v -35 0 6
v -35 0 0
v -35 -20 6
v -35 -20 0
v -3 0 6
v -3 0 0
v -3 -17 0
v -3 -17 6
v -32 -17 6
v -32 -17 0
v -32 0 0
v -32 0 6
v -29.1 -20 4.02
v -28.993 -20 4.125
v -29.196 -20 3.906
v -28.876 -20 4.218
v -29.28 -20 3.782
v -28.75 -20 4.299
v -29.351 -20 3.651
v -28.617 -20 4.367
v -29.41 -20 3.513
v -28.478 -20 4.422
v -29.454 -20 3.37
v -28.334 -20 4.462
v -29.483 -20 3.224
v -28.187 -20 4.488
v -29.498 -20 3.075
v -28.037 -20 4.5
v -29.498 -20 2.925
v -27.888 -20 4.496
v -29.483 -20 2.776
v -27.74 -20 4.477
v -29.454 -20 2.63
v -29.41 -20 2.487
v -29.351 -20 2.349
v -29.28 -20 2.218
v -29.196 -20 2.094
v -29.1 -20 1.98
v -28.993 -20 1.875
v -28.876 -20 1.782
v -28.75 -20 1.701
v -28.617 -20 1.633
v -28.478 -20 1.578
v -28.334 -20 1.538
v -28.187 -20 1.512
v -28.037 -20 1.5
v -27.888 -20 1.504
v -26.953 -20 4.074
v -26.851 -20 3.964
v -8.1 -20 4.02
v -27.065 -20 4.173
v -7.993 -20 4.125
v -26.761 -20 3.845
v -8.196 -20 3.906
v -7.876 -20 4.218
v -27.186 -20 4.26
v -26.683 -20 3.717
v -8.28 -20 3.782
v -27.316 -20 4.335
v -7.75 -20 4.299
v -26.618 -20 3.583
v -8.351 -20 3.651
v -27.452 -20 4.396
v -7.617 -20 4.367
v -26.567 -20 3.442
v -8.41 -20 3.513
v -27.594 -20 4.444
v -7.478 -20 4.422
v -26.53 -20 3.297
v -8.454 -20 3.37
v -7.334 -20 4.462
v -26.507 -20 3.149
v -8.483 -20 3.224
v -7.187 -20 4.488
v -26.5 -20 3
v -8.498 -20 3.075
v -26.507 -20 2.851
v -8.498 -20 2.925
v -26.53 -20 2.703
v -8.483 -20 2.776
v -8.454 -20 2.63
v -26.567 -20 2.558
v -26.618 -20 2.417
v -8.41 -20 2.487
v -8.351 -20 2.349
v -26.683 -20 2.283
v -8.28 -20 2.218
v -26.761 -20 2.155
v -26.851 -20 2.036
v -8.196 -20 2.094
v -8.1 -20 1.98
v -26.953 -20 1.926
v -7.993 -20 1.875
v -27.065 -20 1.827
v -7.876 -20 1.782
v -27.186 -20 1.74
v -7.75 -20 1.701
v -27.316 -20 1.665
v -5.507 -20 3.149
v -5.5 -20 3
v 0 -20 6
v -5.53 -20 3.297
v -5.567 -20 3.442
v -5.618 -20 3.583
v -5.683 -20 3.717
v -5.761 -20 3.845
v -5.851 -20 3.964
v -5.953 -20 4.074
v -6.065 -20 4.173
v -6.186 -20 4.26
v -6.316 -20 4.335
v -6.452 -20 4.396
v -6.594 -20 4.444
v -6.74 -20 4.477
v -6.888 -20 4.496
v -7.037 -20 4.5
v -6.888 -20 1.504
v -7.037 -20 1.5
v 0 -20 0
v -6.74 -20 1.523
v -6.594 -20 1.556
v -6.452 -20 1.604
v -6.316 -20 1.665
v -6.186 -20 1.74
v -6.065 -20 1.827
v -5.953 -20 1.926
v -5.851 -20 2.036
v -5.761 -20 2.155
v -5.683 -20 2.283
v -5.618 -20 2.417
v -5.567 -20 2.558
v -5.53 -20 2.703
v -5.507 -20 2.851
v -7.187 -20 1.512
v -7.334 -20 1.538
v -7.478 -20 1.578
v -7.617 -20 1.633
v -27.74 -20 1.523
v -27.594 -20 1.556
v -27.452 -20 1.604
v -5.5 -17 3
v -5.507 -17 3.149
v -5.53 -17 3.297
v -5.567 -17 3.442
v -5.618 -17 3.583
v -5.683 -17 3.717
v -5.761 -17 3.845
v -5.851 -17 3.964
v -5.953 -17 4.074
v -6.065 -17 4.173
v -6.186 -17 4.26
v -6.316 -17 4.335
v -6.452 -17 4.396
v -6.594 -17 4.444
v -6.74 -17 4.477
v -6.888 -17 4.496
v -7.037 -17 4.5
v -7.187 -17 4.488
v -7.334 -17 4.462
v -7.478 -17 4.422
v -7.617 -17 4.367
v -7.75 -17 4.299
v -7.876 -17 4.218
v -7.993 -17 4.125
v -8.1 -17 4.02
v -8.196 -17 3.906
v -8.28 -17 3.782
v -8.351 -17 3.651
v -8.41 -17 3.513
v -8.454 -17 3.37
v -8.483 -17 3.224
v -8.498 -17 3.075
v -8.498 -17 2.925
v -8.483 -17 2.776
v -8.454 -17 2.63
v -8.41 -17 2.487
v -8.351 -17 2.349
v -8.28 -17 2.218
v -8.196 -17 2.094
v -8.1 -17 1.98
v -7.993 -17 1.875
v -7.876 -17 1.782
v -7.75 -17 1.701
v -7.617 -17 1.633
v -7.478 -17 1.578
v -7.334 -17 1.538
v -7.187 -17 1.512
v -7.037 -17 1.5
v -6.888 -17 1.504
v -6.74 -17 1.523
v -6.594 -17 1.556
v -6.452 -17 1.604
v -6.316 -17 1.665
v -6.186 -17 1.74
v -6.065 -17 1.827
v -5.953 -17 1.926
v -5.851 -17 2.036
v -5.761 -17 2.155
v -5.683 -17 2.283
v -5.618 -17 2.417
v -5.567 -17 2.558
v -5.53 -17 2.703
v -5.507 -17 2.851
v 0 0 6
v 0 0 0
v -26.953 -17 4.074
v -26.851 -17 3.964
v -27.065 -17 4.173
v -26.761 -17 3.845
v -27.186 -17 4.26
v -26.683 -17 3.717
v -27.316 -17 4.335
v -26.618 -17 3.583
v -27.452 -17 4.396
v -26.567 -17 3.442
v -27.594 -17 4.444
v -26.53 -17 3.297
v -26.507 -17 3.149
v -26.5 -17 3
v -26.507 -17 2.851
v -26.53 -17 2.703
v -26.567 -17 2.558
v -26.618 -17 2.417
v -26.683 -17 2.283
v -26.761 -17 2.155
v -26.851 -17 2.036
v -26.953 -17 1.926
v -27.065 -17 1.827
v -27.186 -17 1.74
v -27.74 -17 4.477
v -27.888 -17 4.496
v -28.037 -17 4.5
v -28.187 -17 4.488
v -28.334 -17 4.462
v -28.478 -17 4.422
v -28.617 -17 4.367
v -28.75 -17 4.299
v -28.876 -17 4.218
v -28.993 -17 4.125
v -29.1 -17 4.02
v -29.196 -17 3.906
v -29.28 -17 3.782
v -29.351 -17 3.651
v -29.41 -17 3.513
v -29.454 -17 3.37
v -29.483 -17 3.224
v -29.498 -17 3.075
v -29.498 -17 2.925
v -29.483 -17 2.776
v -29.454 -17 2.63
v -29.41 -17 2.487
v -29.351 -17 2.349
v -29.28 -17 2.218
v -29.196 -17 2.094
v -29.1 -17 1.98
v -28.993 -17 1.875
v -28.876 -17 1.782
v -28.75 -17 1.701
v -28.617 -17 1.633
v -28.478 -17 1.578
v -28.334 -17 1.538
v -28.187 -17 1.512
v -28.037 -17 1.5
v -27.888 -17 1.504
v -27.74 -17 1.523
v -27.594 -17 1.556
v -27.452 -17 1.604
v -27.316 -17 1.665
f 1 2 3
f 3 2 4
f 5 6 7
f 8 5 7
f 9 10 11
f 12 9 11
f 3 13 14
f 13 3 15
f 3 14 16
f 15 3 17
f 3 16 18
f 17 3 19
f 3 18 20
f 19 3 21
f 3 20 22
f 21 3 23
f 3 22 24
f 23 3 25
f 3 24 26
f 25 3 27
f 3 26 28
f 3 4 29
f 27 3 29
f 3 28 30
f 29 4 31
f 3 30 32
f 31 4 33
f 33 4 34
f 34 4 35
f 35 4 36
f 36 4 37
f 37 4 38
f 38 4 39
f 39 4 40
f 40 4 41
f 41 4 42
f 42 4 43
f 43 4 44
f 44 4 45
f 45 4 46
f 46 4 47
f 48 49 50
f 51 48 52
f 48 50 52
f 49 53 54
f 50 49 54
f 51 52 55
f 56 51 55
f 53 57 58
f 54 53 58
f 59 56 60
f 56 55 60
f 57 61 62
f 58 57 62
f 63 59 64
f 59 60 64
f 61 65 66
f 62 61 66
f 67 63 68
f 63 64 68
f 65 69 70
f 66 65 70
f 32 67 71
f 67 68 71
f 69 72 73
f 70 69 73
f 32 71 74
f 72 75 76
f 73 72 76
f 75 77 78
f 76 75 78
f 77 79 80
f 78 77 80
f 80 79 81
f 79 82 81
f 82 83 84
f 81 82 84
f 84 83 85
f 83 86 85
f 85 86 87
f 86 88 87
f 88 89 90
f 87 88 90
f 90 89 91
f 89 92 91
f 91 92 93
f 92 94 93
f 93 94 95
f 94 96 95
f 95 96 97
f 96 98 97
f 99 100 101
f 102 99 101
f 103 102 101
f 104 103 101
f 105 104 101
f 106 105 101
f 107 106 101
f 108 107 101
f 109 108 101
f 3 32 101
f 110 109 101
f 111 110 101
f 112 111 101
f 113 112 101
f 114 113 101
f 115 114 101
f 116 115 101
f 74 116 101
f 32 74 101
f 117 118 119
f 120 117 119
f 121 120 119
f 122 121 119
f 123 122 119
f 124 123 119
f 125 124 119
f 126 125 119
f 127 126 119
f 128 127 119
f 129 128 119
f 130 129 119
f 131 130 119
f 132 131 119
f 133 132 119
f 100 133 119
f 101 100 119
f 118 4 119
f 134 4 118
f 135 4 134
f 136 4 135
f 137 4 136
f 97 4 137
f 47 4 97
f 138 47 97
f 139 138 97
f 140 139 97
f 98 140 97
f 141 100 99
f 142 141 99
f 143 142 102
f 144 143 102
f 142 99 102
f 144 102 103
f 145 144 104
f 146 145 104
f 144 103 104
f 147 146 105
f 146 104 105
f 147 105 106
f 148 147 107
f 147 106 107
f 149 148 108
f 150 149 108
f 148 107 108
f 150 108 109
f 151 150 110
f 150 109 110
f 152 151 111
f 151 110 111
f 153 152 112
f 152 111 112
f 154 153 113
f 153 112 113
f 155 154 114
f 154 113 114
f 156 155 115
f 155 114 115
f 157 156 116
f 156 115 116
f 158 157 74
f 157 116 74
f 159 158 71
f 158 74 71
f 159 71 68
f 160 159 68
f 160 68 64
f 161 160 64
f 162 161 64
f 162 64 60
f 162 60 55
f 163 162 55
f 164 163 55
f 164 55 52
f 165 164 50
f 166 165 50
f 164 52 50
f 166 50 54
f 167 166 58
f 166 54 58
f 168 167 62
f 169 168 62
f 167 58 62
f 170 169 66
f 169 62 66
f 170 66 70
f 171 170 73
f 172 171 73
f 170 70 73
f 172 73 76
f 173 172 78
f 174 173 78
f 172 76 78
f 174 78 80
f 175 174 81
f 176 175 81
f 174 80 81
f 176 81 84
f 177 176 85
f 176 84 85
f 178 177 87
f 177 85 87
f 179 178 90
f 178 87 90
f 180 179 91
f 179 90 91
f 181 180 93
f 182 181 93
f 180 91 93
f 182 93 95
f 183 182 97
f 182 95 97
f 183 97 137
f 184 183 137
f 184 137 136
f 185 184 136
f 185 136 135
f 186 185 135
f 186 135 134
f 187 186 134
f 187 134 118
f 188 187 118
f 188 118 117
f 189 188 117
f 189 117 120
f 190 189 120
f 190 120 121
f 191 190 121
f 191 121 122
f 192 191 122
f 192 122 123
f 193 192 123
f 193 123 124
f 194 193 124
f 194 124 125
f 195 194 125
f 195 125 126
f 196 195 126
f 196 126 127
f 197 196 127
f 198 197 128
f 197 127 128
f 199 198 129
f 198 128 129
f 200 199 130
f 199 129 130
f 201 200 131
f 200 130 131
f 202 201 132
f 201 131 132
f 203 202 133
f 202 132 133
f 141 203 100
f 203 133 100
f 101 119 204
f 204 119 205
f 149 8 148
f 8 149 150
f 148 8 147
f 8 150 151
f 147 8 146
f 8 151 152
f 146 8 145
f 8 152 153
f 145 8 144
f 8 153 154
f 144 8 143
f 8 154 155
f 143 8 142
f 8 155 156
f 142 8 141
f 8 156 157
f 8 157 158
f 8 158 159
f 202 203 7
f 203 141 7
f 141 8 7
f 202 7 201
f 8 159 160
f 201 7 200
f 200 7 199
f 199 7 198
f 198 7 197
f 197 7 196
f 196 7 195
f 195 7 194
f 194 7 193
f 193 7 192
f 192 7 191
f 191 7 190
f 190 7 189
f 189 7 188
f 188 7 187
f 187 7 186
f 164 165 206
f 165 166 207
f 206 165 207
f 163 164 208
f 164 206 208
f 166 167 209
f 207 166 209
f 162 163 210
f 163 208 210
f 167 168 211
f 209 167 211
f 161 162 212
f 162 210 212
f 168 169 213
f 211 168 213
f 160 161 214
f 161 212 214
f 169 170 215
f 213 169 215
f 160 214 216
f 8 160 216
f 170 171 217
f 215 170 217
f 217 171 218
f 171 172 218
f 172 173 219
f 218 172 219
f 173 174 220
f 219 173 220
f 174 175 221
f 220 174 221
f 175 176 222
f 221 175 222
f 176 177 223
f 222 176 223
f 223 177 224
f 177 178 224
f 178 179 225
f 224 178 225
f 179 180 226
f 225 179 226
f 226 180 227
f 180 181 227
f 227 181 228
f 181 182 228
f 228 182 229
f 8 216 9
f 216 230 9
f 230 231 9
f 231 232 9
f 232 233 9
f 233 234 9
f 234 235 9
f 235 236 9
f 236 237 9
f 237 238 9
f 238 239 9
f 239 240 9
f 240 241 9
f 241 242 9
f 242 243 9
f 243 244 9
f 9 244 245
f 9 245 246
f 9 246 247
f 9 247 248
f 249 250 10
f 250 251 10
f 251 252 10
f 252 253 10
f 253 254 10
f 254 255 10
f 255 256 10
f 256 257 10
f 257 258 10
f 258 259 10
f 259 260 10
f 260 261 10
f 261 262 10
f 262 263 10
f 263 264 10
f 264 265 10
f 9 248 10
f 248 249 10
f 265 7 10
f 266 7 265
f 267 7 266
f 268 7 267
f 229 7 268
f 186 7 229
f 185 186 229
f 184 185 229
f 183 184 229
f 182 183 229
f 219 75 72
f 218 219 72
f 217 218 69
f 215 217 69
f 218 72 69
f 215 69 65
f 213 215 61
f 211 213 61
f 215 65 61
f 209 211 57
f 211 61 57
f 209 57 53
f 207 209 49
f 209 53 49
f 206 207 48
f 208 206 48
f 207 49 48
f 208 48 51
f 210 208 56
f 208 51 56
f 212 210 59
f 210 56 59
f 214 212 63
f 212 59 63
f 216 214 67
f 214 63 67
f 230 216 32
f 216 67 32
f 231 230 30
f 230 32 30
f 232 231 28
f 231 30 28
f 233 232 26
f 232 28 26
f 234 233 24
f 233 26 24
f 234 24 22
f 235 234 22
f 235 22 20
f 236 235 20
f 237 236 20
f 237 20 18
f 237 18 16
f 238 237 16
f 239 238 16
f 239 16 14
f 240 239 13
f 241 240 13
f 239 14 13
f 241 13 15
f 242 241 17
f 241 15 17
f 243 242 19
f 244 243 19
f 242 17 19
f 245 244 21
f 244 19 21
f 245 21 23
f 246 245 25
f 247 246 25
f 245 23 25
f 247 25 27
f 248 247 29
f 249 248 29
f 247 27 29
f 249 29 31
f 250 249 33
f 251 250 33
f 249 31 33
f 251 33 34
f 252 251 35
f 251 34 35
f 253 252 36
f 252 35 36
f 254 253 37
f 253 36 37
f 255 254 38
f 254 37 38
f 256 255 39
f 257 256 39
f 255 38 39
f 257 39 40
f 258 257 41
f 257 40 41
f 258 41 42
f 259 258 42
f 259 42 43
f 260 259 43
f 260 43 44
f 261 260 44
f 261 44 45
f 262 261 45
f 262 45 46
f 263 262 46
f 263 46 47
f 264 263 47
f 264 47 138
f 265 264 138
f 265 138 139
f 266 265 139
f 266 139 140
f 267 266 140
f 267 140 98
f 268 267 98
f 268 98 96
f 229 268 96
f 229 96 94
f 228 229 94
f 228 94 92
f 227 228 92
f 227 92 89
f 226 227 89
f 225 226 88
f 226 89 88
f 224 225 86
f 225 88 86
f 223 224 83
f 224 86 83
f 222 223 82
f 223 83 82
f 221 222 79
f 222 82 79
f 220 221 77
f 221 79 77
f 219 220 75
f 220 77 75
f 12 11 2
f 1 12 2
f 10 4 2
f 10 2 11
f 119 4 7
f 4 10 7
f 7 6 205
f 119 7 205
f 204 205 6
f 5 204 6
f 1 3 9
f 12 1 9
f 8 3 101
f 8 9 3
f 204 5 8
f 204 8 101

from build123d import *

# Parameters (mm, degrees)
BOSS_EXTRUDE1_DEPTH = 6
SKETCH2_R           = 1.5
CUT_EXTRUDE1_DEPTH  = 3


with BuildPart() as part:
    # Sketch1 → Boss-Extrude1 (new body)
    with BuildSketch(Plane.XY):
        Polygon((-32, 0), (-35, 0), (-35, -20), (0, -20), (0, 0), (-3, 0), (-3, -17), (-32, -17), align=None)
    extrude(amount=BOSS_EXTRUDE1_DEPTH)

    # Sketch2 → Cut-Extrude1 (cut)
    with BuildSketch(Plane.XZ.offset(20)):
        with Locations((-28, 3)):
            Circle(SKETCH2_R)
        with Locations((-7, 3)):
            Circle(SKETCH2_R)
    extrude(amount=-CUT_EXTRUDE1_DEPTH, mode=Mode.SUBTRACT)


solid = part.part
